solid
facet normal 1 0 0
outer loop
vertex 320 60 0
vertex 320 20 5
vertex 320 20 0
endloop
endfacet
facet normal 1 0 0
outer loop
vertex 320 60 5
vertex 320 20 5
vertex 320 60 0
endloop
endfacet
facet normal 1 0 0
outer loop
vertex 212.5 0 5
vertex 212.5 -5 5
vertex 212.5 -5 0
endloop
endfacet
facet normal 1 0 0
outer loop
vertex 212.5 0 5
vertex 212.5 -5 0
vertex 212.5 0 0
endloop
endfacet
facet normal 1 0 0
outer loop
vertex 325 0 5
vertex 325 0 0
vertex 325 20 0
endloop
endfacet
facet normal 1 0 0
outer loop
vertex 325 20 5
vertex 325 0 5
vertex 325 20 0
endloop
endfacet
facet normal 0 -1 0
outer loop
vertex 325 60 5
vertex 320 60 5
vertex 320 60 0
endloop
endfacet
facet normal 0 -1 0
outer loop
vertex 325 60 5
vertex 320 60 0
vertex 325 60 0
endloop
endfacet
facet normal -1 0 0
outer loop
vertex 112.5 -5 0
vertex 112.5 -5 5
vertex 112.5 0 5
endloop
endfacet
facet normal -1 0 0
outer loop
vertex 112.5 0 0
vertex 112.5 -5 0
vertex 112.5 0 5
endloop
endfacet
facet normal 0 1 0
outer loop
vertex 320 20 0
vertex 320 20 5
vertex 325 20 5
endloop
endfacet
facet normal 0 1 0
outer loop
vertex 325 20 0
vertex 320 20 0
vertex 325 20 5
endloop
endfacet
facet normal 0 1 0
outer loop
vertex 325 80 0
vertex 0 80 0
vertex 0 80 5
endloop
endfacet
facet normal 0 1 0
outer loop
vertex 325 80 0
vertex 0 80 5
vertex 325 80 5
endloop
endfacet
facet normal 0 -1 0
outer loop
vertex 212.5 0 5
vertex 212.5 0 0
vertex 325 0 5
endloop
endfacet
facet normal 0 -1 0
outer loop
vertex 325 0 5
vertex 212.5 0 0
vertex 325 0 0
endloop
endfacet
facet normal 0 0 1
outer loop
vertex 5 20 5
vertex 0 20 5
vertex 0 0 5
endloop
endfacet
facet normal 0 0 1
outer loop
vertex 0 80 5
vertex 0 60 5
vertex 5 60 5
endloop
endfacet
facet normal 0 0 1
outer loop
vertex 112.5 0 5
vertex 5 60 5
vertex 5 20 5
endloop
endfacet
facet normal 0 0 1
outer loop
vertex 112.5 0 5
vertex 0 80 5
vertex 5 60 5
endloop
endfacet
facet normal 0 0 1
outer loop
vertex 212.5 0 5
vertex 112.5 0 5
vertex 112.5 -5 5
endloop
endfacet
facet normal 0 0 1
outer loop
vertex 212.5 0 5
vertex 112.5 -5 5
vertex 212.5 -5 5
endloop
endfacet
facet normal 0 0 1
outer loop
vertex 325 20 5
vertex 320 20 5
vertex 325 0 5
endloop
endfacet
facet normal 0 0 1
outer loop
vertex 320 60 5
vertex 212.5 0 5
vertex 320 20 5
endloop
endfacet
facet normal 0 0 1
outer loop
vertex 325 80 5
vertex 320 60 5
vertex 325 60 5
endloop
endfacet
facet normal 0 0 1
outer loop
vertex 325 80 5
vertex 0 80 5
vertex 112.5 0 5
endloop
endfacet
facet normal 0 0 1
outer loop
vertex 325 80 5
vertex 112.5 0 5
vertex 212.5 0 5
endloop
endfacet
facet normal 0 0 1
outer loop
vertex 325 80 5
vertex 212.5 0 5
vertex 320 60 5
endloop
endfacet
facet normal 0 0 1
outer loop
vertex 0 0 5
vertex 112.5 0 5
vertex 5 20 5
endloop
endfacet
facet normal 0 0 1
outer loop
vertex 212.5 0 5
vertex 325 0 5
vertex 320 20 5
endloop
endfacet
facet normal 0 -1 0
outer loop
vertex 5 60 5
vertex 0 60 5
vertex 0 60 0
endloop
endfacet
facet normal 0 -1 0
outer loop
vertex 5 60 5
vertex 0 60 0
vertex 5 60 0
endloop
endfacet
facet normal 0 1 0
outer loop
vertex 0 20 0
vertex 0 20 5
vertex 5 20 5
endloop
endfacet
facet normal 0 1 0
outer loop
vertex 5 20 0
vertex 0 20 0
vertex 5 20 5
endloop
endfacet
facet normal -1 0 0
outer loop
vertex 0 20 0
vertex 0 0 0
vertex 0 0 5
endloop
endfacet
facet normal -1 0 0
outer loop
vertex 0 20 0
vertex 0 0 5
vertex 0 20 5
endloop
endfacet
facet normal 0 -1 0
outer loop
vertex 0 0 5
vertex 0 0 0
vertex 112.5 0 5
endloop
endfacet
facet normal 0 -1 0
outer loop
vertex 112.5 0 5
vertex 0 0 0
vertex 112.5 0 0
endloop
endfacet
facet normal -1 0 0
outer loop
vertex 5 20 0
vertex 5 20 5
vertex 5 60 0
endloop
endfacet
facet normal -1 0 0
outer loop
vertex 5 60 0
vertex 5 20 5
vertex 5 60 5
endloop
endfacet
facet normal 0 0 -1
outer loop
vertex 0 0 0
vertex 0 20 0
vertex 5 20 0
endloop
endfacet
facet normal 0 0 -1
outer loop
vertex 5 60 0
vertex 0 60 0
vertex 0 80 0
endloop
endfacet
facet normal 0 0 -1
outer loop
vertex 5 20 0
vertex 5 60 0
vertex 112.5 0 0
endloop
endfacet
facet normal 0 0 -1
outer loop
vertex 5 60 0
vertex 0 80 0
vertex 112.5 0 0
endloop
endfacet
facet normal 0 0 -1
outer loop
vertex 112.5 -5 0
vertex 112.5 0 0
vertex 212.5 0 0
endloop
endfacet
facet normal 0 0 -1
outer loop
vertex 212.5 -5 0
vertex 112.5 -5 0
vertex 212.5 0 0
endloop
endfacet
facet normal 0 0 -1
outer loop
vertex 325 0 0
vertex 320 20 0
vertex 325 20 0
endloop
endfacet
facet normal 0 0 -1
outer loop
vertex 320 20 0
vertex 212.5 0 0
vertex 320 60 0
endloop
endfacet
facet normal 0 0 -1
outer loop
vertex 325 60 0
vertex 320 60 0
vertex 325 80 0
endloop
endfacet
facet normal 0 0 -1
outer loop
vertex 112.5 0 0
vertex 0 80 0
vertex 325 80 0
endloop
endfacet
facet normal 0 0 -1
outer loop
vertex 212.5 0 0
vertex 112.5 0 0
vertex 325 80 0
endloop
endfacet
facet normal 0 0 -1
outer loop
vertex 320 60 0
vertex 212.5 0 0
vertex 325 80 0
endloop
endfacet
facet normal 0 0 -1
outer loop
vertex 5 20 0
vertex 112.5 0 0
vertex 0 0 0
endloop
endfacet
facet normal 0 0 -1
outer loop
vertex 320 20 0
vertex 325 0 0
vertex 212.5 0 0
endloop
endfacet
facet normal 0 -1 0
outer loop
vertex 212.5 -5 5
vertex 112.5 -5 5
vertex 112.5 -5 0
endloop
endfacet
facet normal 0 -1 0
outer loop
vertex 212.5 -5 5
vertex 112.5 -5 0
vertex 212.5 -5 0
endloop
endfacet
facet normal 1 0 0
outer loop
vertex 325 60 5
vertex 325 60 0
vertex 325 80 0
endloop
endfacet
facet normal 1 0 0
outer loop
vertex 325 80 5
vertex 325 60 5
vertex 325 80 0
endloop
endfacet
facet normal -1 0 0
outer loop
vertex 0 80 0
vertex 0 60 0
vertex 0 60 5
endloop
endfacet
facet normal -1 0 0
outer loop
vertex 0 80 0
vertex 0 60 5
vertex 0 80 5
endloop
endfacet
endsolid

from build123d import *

# Parameters (mm, degrees)
SKIZZE1_W                       = 325
SKIZZE1_H                       = 80
AUFSATZ_LINEAR_AUSTRAGEN1_DEPTH = 5
SKIZZE2_W                       = 100
SKIZZE2_H                       = 5
AUFSATZ_LINEAR_AUSTRAGEN3_DEPTH = 5
SKIZZE3_W                       = 5
SKIZZE3_H                       = 40
SCHNITT_LINEAR_AUSTRAGEN1_DEPTH = 335.738704066


with BuildPart() as part:
    # Skizze1 → Aufsatz-Linear austragen1 (new body)
    with BuildSketch(Plane.XY):
        with Locations((162.5, 40)):
            Rectangle(SKIZZE1_W, SKIZZE1_H)
    extrude(amount=AUFSATZ_LINEAR_AUSTRAGEN1_DEPTH)

    # Skizze2 → Aufsatz-Linear austragen3 (add, through all)
    with BuildSketch(Plane.XY.offset(5)):
        with Locations((162.5, -2.5)):
            Rectangle(SKIZZE2_W, SKIZZE2_H)
    extrude(amount=-AUFSATZ_LINEAR_AUSTRAGEN3_DEPTH)

    # Skizze3 → Schnitt-Linear austragen1 (cut, through all)
    with BuildSketch(Plane.XY.offset(5)):
        with Locations((2.5, 40)):
            Rectangle(SKIZZE3_W, SKIZZE3_H)
        with Locations((322.5, 40)):
            Rectangle(SKIZZE3_W, SKIZZE3_H)
    extrude(amount=-SCHNITT_LINEAR_AUSTRAGEN1_DEPTH, mode=Mode.SUBTRACT)


solid = part.part
